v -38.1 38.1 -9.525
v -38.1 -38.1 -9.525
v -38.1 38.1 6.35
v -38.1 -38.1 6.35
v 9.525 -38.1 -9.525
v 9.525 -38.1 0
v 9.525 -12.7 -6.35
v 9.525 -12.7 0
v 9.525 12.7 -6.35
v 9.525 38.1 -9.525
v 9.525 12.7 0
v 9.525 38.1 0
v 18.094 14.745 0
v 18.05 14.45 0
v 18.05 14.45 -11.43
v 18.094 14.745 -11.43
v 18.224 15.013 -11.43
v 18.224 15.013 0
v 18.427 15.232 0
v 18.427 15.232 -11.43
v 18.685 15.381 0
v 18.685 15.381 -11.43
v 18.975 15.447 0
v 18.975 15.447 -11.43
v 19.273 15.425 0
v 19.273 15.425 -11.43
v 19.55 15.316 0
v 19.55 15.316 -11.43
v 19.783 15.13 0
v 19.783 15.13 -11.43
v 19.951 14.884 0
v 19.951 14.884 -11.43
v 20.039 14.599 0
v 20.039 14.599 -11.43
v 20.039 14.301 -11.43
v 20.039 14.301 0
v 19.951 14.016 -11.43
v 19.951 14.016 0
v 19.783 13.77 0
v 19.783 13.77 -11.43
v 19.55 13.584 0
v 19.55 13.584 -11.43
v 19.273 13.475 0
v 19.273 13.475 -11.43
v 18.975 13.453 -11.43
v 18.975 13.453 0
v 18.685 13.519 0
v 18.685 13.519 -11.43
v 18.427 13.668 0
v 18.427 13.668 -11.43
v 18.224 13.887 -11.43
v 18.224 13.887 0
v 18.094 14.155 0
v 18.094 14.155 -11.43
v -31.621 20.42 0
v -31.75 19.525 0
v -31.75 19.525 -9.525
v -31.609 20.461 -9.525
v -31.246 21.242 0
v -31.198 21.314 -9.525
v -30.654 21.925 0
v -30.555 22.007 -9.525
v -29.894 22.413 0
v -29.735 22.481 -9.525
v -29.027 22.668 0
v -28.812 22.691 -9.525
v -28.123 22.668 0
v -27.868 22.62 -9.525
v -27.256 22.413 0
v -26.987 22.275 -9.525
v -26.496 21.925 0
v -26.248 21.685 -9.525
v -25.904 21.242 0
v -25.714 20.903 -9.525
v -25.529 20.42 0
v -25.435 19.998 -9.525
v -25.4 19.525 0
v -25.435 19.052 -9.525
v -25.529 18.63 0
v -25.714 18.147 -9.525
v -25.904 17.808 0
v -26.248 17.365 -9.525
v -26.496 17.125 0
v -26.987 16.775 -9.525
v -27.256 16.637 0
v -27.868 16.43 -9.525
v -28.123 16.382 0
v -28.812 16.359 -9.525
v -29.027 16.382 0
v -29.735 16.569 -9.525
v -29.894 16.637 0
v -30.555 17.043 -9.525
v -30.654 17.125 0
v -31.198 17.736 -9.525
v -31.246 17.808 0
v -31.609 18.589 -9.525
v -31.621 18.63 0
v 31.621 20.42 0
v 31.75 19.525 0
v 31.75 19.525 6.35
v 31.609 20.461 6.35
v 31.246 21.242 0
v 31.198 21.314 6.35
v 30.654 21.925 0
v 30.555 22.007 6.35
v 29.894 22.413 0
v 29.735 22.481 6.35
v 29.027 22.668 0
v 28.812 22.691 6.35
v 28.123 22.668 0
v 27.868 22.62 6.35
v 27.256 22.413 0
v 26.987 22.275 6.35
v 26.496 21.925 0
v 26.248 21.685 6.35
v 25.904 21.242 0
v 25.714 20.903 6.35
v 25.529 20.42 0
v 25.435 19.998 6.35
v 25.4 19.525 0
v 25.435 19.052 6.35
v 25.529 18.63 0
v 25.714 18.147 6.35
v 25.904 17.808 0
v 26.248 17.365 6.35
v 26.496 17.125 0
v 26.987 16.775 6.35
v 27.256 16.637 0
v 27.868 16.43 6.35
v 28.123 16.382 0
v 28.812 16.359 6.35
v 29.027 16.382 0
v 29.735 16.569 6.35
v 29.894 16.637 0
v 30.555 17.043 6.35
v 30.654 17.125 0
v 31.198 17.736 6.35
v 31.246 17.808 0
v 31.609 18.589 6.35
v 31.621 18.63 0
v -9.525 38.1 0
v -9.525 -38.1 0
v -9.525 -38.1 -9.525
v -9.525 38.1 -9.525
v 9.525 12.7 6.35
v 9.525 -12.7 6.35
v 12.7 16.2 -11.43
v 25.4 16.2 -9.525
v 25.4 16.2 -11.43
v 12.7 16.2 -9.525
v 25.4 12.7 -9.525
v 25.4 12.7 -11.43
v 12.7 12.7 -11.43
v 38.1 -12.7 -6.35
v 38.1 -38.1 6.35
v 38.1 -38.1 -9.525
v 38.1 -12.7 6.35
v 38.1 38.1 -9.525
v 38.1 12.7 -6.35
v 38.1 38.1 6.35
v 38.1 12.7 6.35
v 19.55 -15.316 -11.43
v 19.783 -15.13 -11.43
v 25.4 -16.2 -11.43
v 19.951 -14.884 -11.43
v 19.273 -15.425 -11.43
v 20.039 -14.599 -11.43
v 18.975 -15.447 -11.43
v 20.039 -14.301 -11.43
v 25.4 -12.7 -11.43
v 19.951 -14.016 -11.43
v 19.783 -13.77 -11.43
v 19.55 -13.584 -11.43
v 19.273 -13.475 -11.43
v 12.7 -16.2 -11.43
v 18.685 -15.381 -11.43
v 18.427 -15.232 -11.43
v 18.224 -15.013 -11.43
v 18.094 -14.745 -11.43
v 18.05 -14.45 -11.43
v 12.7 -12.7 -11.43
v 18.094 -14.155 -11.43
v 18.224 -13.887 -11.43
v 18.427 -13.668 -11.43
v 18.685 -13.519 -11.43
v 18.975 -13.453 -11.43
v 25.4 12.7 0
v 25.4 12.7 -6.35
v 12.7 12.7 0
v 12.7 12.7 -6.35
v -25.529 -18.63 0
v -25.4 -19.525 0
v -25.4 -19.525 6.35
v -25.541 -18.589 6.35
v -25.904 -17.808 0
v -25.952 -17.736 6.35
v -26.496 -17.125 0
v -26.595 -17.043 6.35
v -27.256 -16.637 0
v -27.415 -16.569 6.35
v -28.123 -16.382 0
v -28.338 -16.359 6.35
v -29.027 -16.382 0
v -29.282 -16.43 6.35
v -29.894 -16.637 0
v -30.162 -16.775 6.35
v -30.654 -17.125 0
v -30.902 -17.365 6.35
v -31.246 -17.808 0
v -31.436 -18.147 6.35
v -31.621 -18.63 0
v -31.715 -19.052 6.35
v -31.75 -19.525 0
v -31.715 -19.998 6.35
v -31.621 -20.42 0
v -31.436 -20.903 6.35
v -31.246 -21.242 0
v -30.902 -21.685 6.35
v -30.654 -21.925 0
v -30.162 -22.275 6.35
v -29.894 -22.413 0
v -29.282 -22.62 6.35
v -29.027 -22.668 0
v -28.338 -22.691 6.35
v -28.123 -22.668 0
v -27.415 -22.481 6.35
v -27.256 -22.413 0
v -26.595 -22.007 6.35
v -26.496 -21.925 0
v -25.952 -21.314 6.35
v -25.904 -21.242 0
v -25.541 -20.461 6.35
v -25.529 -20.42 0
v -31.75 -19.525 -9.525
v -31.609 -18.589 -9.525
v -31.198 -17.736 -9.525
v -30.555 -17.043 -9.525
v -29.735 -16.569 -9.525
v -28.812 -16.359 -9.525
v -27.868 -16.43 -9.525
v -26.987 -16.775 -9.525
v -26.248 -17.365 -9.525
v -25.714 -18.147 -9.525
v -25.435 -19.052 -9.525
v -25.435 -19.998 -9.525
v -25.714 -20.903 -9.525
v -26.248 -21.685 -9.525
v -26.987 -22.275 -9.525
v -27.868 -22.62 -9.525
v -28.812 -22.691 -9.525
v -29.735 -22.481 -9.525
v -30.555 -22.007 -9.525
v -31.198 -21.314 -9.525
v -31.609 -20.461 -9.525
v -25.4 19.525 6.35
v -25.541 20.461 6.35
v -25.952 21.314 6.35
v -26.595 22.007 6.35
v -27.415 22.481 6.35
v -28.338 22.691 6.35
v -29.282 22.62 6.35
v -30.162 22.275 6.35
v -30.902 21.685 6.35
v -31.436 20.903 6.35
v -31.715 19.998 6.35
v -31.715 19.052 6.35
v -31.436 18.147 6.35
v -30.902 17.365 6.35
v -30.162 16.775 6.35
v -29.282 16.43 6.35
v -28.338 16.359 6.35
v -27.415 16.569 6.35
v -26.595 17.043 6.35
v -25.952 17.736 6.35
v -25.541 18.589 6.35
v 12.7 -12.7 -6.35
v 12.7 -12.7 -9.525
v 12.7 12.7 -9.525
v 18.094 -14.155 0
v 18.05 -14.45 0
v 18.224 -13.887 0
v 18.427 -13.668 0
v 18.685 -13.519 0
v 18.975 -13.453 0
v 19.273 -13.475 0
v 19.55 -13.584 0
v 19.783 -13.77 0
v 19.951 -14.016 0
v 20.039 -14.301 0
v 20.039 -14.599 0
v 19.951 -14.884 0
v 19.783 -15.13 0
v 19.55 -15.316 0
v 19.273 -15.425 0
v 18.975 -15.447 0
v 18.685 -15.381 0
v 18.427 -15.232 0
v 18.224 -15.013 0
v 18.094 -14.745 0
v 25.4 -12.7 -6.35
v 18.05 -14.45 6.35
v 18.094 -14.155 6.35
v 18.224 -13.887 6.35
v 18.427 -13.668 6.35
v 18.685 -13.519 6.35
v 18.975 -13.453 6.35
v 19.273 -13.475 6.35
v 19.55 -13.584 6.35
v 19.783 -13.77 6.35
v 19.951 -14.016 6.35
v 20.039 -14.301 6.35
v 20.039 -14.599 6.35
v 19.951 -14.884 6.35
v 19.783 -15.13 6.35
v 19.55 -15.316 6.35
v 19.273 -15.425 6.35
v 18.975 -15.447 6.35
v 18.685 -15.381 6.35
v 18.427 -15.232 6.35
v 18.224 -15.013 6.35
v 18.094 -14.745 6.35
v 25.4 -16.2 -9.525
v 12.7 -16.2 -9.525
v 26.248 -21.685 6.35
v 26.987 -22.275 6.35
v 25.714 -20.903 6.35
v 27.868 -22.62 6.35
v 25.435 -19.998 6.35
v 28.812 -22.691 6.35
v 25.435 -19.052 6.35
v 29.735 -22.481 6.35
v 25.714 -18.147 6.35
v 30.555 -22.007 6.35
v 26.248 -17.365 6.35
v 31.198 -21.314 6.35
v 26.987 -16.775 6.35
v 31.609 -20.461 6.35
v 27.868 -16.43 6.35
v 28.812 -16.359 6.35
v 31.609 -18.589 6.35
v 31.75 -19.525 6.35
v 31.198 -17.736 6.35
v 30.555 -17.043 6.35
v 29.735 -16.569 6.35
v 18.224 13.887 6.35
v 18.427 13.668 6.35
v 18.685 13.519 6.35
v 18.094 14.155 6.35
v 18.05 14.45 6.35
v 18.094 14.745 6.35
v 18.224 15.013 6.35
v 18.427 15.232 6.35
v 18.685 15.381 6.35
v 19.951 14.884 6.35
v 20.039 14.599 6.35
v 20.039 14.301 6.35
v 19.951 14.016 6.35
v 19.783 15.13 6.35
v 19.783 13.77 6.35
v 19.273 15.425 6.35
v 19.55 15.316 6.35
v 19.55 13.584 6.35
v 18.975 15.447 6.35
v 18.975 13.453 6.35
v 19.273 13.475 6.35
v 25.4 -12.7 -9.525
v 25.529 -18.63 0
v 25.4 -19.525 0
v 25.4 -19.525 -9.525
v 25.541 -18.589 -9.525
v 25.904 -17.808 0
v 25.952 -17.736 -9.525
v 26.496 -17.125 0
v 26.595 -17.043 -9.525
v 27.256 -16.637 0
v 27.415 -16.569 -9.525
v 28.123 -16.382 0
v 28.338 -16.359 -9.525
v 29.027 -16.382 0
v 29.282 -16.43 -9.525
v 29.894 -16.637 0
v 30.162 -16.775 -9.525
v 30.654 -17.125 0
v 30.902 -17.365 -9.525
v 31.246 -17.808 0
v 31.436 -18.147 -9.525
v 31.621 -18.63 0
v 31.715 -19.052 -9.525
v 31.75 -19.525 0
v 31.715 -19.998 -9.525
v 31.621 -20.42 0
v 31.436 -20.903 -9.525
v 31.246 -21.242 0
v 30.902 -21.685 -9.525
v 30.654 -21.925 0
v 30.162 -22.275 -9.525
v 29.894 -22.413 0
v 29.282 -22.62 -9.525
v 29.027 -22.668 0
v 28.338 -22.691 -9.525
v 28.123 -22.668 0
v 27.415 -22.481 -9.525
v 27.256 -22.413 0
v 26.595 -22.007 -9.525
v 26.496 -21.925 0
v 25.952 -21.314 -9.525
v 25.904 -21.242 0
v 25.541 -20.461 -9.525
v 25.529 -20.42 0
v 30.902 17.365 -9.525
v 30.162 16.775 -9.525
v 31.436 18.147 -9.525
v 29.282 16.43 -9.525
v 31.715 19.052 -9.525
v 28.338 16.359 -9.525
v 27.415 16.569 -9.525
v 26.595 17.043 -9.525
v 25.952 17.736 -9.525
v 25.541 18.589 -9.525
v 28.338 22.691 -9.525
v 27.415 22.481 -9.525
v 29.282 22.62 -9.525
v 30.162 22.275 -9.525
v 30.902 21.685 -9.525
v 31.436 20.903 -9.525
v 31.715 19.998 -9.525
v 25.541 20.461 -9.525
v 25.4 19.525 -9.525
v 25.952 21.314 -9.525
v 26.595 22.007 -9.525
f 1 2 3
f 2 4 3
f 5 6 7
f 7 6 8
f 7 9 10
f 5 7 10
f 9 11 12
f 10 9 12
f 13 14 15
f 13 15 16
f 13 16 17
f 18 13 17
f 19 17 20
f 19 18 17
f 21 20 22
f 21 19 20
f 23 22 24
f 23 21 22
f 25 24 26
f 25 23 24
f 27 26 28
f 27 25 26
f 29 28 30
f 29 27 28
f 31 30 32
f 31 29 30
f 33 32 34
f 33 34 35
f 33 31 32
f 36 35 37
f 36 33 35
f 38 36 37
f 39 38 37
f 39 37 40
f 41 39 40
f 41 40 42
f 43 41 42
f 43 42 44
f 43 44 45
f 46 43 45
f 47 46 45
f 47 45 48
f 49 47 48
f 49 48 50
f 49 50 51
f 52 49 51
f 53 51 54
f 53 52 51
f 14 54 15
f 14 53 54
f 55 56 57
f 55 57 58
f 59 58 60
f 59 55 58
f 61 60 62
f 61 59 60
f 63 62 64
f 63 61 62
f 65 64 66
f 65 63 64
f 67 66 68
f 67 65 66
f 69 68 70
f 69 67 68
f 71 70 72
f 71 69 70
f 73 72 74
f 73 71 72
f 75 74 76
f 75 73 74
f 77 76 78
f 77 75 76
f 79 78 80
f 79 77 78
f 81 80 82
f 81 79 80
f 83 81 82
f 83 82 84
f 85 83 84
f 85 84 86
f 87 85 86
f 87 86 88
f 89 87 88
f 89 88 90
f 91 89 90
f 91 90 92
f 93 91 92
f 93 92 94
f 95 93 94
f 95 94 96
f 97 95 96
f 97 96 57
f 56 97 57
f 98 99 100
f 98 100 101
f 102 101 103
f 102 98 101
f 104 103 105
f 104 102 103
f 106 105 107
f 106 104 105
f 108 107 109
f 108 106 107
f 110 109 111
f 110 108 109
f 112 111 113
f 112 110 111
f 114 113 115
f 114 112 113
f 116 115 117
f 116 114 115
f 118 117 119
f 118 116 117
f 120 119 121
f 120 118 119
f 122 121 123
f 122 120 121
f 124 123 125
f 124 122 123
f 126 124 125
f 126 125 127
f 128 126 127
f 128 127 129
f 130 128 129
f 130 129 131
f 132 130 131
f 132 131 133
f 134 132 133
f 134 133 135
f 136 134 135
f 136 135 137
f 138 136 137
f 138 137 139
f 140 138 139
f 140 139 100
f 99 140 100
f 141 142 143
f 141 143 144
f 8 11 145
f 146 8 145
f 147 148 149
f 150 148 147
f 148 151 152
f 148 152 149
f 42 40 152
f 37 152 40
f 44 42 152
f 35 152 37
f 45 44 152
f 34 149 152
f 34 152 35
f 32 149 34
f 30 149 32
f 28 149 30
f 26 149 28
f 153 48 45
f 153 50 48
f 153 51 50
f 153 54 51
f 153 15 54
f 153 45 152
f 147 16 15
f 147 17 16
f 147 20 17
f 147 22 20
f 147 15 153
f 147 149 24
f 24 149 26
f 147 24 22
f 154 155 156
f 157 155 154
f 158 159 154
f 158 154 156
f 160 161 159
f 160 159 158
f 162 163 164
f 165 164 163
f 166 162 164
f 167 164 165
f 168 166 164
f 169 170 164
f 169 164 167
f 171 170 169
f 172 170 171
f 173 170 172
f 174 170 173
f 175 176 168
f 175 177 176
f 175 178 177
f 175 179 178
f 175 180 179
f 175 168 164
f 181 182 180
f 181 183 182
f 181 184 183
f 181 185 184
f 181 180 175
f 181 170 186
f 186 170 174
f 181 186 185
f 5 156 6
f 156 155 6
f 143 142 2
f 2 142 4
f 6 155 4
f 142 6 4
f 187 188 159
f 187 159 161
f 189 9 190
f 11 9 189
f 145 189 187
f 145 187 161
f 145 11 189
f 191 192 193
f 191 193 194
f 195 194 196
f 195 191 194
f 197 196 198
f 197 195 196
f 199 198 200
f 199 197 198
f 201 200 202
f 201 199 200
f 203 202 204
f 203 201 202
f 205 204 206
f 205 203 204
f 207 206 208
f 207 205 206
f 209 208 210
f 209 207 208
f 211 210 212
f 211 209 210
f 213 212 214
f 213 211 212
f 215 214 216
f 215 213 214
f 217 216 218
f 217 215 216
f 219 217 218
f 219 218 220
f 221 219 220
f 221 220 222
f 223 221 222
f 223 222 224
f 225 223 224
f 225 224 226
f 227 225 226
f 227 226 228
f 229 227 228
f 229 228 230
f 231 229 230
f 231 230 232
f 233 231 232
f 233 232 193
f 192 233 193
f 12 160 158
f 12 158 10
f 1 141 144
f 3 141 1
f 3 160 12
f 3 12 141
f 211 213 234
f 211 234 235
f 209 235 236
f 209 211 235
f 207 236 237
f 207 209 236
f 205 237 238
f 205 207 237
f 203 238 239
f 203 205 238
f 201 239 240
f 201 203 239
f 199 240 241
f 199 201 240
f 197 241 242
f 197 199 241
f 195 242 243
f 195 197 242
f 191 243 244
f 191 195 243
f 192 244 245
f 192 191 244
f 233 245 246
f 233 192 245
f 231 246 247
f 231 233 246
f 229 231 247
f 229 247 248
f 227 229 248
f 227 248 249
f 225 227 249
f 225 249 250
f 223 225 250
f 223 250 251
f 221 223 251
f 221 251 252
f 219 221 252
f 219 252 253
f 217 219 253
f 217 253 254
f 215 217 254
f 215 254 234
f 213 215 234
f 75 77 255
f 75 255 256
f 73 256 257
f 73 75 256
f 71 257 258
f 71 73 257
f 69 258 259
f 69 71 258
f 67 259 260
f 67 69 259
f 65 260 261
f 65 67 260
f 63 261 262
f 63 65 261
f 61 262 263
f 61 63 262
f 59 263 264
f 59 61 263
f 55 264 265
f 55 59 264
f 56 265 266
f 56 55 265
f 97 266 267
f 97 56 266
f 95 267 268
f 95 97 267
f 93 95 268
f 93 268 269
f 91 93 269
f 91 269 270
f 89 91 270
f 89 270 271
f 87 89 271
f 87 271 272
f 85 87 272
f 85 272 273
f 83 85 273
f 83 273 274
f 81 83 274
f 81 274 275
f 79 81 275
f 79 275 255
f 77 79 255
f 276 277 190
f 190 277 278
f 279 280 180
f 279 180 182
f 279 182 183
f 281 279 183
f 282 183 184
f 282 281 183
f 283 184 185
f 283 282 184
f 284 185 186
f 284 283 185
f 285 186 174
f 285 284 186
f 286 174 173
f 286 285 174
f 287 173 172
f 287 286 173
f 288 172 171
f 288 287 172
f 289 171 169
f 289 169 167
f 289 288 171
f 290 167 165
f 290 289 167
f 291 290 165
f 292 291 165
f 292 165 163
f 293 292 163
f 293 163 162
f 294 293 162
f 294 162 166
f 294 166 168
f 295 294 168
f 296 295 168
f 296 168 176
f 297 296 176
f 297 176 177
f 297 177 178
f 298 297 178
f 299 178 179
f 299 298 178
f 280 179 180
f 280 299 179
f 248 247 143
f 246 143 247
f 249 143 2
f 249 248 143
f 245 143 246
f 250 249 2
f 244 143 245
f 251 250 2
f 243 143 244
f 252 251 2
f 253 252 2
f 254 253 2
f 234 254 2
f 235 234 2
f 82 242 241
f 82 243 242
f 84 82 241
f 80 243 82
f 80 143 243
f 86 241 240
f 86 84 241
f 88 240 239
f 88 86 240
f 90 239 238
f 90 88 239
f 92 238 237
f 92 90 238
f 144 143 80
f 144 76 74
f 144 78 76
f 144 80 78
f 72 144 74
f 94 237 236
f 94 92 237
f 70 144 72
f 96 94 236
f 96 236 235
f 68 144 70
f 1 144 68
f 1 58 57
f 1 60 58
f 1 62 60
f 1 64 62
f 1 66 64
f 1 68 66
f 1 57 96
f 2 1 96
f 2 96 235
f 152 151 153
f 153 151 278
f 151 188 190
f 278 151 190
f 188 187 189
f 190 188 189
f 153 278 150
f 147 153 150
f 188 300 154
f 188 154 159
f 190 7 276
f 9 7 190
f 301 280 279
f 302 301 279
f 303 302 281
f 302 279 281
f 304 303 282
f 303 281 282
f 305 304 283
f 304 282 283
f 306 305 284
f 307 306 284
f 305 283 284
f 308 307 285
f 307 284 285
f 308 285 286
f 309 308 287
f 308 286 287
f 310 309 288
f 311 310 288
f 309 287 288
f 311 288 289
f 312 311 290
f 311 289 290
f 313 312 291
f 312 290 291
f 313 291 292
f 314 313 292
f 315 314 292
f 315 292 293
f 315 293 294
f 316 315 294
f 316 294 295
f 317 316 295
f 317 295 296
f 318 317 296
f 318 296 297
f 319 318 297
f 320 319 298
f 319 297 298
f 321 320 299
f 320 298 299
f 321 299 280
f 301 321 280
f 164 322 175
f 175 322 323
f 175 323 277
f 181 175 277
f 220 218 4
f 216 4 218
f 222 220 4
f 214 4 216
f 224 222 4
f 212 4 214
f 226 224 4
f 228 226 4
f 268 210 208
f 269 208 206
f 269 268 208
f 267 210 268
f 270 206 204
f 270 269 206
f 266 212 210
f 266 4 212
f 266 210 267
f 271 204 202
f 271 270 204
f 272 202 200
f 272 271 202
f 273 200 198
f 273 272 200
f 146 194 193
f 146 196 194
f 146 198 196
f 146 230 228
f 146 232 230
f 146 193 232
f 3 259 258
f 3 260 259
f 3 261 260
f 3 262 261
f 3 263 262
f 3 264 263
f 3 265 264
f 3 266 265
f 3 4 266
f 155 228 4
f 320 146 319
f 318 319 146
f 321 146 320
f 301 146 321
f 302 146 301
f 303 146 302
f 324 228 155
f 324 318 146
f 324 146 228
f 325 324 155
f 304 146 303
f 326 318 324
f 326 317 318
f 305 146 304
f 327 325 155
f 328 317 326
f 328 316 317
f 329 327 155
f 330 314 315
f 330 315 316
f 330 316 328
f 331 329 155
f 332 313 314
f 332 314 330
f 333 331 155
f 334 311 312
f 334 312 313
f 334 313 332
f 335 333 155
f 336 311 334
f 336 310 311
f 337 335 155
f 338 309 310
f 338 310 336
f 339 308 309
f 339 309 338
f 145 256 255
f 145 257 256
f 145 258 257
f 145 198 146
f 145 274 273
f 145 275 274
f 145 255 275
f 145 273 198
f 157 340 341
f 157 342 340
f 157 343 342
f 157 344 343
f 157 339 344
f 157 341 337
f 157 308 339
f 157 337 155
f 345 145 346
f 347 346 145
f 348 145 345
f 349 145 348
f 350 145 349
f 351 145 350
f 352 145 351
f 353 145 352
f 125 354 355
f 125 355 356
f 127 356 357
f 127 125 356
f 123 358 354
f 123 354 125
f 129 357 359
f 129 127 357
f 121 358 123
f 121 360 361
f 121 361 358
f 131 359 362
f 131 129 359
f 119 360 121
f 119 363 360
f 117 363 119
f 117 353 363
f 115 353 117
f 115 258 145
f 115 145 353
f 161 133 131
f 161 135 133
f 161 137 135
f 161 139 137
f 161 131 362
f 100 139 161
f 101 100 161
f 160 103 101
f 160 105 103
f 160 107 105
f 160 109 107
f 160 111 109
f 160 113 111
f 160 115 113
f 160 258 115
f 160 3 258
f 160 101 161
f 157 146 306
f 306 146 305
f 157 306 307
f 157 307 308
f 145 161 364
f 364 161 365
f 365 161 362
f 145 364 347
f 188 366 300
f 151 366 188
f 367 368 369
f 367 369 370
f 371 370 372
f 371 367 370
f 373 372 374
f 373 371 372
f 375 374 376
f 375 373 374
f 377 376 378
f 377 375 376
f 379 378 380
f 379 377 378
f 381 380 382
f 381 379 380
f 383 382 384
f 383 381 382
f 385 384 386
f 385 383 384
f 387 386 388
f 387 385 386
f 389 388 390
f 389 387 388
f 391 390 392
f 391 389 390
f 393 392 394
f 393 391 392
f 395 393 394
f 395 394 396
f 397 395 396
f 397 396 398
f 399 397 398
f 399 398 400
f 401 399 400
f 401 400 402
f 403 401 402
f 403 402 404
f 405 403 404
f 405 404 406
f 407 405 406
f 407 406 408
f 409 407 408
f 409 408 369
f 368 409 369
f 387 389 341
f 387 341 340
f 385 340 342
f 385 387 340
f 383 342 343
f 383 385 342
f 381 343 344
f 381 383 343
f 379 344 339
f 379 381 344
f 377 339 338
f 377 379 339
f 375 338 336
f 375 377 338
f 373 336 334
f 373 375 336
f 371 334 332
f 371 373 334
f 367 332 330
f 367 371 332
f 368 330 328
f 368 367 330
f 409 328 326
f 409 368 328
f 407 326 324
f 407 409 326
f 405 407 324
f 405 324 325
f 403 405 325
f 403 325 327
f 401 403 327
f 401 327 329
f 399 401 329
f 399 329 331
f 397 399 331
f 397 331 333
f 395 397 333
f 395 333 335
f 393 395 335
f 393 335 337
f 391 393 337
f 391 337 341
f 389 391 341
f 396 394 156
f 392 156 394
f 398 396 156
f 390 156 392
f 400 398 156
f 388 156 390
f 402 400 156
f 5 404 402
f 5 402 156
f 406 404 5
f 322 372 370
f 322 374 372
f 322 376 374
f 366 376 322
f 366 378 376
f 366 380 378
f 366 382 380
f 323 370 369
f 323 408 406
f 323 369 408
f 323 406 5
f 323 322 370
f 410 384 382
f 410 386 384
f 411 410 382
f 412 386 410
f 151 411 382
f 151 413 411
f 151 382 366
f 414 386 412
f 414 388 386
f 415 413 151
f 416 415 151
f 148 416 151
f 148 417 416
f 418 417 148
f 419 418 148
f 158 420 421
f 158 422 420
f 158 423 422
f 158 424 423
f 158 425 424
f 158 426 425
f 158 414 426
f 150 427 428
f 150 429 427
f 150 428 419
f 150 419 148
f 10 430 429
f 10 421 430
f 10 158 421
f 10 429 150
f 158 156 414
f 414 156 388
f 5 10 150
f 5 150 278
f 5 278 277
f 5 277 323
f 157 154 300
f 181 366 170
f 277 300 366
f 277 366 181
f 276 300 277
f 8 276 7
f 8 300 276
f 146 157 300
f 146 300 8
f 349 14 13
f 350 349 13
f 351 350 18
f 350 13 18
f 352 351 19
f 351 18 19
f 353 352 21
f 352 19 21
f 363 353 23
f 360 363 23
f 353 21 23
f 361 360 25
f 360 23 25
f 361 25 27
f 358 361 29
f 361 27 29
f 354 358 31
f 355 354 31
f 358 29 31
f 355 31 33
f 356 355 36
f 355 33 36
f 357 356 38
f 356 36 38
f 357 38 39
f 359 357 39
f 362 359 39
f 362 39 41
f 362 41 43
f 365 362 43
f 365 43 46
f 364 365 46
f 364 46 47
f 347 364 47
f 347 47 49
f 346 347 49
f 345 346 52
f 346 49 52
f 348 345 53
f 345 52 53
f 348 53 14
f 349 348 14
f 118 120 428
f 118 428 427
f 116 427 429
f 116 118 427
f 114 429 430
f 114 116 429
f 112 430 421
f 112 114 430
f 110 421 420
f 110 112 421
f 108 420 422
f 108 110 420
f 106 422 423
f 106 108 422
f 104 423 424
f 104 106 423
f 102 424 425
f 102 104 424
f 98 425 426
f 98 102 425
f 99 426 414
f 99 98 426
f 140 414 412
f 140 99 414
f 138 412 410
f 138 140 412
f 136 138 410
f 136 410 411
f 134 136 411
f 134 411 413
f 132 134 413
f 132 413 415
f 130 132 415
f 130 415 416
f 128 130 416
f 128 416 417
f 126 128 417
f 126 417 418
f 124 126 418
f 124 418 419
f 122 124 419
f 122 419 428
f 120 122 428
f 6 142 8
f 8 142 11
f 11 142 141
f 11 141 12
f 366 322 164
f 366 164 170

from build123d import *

# Parameters (mm, degrees)
SKETCH1_W           = 76.2
SKETCH1_H           = 76.2
SKETCH1_R           = 3.175
BOSS_EXTRUDE1_DEPTH = 6.35
SKETCH2_W           = 28.575
SKETCH2_H           = 76.2
SKETCH2_R           = 3.175
BOSS_EXTRUDE3_DEPTH = 9.525
SKETCH4_W           = 12.7
SKETCH4_H           = 25.4
CUT_EXTRUDE1_DEPTH  = 28.575
SKETCH5_W           = 12.7
SKETCH5_H           = 32.4
CUT_EXTRUDE2_DEPTH  = 9.525
SKETCH6_R           = 1
CUT_EXTRUDE3_DEPTH  = 6.35
SKETCH7_W           = 12.7
SKETCH7_H           = 3.5
SKETCH7_R           = 1
BOSS_EXTRUDE4_DEPTH = 11.43


with BuildPart() as part:
    # Sketch1 → Boss-Extrude1 (new body)
    with BuildSketch(Plane.XY):
        Rectangle(SKETCH1_W, SKETCH1_H)
        with Locations((-28.575, 19.525)):
            Circle(SKETCH1_R, mode=Mode.SUBTRACT)
        with Locations((28.575, 19.525)):
            Circle(SKETCH1_R, mode=Mode.SUBTRACT)
        with Locations((28.575, -19.525)):
            Circle(SKETCH1_R, mode=Mode.SUBTRACT)
        with Locations((-28.575, -19.525)):
            Circle(SKETCH1_R, mode=Mode.SUBTRACT)
    extrude(amount=BOSS_EXTRUDE1_DEPTH)

    # Sketch2 → Boss-Extrude3 (add)
    with BuildSketch(Plane(origin=(0, 0, 0), x_dir=(-1, 0, 0), z_dir=(0, 0, -1))):
        with Locations((-23.8125, 0)):
            Rectangle(SKETCH2_W, SKETCH2_H)
        with Locations((-28.575, -19.525)):
            Circle(SKETCH2_R, mode=Mode.SUBTRACT)
        with Locations((-28.575, 19.525)):
            Circle(SKETCH2_R, mode=Mode.SUBTRACT)
        with Locations((23.8125, 0)):
            Rectangle(SKETCH2_W, SKETCH2_H)
        with Locations((28.575, -19.525)):
            Circle(SKETCH2_R, mode=Mode.SUBTRACT)
        with Locations((28.575, 19.525)):
            Circle(SKETCH2_R, mode=Mode.SUBTRACT)
    extrude(amount=BOSS_EXTRUDE3_DEPTH)

    # Sketch4 → Cut-Extrude1 (cut)
    with BuildSketch(Plane.ZY.offset(-9.525)):
        Rectangle(SKETCH4_W, SKETCH4_H)
    extrude(amount=-CUT_EXTRUDE1_DEPTH, mode=Mode.SUBTRACT)

    # Sketch5 → Cut-Extrude2 (cut)
    with BuildSketch(Plane(origin=(0, 0, -9.525), x_dir=(-1, 0, 0), z_dir=(0, 0, -1))):
        with Locations((-19.05, 0)):
            Rectangle(SKETCH5_W, SKETCH5_H)
    extrude(amount=-CUT_EXTRUDE2_DEPTH, mode=Mode.SUBTRACT)

    # Sketch6 → Cut-Extrude3 (cut)
    with BuildSketch(Plane(origin=(0, 0, 0), x_dir=(-1, 0, 0), z_dir=(0, 0, -1))):
        with Locations((-19.05, 14.45)):
            Circle(SKETCH6_R)
        with Locations((-19.05, -14.45)):
            Circle(SKETCH6_R)
    extrude(amount=-CUT_EXTRUDE3_DEPTH, mode=Mode.SUBTRACT)

    # Sketch7 → Boss-Extrude4 (add)
    with BuildSketch(Plane(origin=(0, 0, 0), x_dir=(-1, 0, 0), z_dir=(0, 0, -1))):
        with Locations((-19.05, -14.45)):
            Rectangle(SKETCH7_W, SKETCH7_H)
        with Locations((-19.05, -14.45)):
            Circle(SKETCH7_R, mode=Mode.SUBTRACT)
        with Locations((-19.05, 14.45)):
            Rectangle(SKETCH7_W, SKETCH7_H)
        with Locations((-19.05, 14.45)):
            Circle(SKETCH7_R, mode=Mode.SUBTRACT)
    extrude(amount=BOSS_EXTRUDE4_DEPTH)


solid = part.part
